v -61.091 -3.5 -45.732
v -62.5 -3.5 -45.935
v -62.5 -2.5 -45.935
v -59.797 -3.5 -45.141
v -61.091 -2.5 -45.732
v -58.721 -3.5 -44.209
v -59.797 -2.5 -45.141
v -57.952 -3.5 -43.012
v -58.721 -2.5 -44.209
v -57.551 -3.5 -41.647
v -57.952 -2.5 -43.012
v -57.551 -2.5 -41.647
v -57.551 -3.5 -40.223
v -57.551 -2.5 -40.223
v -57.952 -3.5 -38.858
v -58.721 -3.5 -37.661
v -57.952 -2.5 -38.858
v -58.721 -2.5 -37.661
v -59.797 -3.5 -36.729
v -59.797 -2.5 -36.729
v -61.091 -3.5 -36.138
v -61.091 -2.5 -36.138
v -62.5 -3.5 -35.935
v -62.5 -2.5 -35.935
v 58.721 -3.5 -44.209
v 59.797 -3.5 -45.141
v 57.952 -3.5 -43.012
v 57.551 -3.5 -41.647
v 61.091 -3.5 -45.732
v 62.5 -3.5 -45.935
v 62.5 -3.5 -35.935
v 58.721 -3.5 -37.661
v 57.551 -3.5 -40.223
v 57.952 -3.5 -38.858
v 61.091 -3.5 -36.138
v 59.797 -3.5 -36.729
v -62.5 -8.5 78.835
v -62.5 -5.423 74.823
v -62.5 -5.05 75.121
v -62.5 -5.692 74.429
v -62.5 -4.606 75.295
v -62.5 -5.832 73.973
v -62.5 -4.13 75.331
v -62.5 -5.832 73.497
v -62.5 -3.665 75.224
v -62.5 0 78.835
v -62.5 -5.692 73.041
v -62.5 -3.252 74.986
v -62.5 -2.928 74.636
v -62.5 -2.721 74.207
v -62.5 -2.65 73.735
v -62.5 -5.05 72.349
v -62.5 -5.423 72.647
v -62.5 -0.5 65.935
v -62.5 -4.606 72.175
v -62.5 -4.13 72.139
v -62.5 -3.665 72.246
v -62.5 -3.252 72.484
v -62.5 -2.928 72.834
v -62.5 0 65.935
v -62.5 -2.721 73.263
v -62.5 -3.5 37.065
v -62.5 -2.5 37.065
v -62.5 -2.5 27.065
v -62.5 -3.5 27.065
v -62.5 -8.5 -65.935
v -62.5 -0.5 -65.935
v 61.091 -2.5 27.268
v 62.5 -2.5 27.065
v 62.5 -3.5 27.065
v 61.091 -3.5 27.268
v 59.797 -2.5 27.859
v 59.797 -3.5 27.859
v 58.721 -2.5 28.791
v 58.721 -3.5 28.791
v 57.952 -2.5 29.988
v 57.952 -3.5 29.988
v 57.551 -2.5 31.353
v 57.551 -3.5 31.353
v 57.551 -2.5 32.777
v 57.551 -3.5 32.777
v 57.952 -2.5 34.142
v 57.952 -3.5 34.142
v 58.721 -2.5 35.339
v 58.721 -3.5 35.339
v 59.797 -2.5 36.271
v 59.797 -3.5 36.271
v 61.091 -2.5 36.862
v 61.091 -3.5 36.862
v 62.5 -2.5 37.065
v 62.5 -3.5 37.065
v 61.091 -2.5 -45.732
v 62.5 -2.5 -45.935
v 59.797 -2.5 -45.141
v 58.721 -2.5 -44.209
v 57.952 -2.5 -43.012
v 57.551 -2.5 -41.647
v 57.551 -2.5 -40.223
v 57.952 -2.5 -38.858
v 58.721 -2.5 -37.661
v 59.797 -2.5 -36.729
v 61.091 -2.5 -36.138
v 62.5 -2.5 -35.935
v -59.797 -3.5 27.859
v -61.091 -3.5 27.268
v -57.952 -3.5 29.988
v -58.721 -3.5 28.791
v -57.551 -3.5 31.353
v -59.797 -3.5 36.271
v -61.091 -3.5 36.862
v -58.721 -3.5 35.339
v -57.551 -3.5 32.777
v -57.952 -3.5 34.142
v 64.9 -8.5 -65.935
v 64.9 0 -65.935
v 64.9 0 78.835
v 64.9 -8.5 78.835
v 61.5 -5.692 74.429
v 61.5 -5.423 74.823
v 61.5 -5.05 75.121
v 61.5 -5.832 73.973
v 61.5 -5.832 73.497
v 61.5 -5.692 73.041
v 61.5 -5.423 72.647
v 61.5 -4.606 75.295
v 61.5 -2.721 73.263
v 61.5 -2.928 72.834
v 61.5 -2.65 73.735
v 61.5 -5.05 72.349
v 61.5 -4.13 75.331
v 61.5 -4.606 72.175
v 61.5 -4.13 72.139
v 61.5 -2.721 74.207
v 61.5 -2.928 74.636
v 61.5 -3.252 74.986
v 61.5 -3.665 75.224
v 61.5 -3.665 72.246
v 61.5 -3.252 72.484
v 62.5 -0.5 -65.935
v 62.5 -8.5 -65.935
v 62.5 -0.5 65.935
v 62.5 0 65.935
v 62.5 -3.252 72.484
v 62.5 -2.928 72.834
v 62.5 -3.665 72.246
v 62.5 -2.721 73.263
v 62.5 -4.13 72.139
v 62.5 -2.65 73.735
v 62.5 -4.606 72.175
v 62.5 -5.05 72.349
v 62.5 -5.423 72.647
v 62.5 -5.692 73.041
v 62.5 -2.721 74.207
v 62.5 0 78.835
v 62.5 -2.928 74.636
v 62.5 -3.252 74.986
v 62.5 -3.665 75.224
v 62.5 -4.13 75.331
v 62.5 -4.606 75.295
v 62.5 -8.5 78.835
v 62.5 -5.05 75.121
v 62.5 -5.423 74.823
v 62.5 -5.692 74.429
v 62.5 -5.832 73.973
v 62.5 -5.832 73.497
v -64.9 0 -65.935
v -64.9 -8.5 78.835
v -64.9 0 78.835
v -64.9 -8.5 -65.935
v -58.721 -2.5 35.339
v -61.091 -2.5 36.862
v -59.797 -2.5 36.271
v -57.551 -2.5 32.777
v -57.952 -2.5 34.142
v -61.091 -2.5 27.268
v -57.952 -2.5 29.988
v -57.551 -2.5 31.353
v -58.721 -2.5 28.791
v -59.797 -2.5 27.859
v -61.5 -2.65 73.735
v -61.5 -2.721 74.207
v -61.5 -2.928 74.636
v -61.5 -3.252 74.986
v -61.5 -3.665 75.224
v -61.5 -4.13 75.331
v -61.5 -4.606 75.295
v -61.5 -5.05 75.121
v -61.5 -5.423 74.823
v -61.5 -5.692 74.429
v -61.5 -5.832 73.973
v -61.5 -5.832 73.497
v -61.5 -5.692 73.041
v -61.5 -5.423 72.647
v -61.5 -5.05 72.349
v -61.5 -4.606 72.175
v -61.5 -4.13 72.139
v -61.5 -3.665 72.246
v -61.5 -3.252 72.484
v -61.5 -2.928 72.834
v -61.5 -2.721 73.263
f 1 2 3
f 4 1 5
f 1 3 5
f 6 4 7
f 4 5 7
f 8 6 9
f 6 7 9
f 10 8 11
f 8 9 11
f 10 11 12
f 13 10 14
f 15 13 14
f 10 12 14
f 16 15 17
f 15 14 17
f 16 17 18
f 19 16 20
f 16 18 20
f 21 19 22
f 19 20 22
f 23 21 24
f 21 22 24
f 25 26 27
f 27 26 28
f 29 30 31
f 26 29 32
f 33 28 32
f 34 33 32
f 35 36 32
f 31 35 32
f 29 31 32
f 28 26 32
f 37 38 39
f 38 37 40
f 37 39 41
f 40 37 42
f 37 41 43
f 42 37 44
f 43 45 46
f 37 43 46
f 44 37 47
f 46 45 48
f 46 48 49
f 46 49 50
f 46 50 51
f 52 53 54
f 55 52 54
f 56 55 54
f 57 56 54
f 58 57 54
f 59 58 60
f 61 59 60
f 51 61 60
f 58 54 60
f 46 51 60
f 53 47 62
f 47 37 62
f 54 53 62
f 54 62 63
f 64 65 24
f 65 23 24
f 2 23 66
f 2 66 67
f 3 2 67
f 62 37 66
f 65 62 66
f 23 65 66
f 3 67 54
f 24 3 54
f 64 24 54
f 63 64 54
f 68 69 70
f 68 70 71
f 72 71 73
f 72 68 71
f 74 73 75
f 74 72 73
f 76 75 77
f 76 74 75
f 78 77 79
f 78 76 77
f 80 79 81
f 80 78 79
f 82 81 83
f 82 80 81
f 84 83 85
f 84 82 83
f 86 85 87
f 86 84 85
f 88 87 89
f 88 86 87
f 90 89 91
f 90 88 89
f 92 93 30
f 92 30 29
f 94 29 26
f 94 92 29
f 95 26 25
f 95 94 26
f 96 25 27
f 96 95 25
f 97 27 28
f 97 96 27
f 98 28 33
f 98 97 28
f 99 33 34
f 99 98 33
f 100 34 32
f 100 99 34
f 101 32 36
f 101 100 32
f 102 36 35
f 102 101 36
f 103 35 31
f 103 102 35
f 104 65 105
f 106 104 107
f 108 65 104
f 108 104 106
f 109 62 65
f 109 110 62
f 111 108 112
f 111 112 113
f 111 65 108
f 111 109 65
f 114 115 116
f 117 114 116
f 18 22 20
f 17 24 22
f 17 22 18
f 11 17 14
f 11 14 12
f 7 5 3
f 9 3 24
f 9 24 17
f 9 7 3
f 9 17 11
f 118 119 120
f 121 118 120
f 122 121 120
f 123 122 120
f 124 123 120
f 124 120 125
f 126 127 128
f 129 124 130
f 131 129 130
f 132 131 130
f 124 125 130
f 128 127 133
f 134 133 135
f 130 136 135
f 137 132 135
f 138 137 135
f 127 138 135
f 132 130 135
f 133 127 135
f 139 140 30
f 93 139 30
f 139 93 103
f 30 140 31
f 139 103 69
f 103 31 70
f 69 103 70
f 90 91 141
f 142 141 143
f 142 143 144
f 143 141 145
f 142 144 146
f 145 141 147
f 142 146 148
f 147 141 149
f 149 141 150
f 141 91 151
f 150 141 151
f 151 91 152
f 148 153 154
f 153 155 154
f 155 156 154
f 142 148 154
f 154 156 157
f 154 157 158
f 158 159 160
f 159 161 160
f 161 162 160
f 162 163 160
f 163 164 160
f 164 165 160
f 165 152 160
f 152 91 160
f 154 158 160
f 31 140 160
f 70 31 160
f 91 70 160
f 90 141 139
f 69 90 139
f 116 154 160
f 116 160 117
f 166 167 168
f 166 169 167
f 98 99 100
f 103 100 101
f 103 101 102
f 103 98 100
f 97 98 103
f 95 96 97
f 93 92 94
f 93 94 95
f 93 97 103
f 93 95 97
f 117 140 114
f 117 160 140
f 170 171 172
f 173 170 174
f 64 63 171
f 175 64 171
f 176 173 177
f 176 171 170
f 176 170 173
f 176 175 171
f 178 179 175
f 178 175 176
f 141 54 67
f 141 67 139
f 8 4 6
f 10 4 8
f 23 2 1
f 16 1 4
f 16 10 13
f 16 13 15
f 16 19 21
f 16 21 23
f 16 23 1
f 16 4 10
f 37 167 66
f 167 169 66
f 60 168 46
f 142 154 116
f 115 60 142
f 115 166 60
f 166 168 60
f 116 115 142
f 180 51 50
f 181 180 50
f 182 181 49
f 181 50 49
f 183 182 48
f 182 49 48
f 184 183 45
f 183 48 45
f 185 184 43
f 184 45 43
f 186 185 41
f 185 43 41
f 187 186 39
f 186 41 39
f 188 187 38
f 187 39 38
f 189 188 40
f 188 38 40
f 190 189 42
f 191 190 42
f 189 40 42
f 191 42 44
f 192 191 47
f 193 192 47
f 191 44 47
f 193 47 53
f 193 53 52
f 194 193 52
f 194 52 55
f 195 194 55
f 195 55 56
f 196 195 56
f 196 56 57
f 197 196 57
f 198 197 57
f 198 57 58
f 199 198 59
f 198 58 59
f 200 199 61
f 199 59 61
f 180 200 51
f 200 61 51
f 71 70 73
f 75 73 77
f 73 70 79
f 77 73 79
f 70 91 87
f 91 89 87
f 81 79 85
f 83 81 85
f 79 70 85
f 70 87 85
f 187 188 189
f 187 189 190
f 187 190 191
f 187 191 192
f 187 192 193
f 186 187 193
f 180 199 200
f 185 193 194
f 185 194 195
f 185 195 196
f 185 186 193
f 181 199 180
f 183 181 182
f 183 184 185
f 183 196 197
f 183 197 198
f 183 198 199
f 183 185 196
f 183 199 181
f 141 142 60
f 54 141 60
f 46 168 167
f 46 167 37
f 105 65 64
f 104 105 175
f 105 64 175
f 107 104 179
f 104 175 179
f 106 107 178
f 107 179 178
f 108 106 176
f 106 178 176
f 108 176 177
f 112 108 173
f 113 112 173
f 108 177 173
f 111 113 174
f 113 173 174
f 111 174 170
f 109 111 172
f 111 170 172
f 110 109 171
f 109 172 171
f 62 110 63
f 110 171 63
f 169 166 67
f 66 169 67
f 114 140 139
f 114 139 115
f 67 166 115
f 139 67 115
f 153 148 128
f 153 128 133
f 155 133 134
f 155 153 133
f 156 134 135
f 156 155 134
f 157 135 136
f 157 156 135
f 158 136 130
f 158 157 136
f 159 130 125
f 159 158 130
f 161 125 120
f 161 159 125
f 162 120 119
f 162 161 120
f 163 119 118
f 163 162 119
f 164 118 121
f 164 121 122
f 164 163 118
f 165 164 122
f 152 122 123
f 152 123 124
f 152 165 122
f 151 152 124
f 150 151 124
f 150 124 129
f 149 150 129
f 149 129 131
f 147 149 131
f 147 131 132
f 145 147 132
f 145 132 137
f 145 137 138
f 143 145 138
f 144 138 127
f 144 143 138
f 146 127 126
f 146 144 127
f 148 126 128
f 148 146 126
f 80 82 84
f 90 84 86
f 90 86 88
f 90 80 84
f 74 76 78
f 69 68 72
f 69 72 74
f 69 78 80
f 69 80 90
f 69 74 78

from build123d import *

# Parameters (mm, degrees)
F0_W      = 1.2
F0_H      = 131.87
F0_W_2    = 127.4
F1_DEPTH  = 8.5
F2_W      = 125
F2_H      = 131.87
F3_DEPTH  = 8
F4_W      = 2.4
F4_H      = 8.5
F5_DEPTH  = 12.9
F6_R      = 1.6
F7_DEPTH  = 1
F9_DEPTH  = 3
F10_W     = 125
F10_H     = 2
F11_DEPTH = 130


# Not quite as in the source:
# - a pattern or mirror of a feature is missing from the dataset's text; its kind, count and spacing are read off the source's solid


with BuildPart() as f1:
    # F0 (on Front) → F1 (new body)
    with BuildSketch(Plane.XZ):
        with Locations((-64.3, 0)):
            Rectangle(F0_W, F0_H)
        Rectangle(F0_W_2, F0_H)
        with Locations((64.3, 0)):
            Rectangle(F0_W, F0_H)
    extrude(amount=F1_DEPTH)

    # F2 (on face) → F3 (cut)
    with BuildSketch(Plane.XZ.offset(8.5)):
        Rectangle(F2_W, F2_H)
    extrude(amount=-F3_DEPTH, mode=Mode.SUBTRACT)

    # F4 (on face) → F5 (join)
    with BuildSketch(Plane.XY.offset(65.935)):
        with Locations((-63.7, -4.25)):
            Rectangle(F4_W, F4_H)
        with Locations((63.7, -4.25)):
            Rectangle(F4_W, F4_H)
    extrude(amount=F5_DEPTH)

    # F6 (on face) → F7 (join)
    with BuildSketch(Plane.YZ.offset(-62.5)):
        with Locations((-4.25, 73.735)):
            Circle(F6_R)
    f7 = extrude(amount=F7_DEPTH)

    # F7_copies: F7 across plane
    add(f7.mirror(Plane(origin=(0, 0, 0), x_dir=(0, 0, 1), z_dir=(1, 0, 0))))

    # F8 (on face) → F9 (join)
    with BuildSketch(Plane.XZ.offset(0.5)):
        with BuildLine():
            Line((-62.5, -35.935), (-62.5, -45.935))
            ThreePointArc((-62.5, -45.935), (-57.5, -40.935), (-62.5, -35.935))
        make_face()
        with BuildLine():
            Line((-62.5, 37.065), (-62.5, 27.065))
            ThreePointArc((-62.5, 27.065), (-57.5, 32.065), (-62.5, 37.065))
        make_face()
    f9 = extrude(amount=F9_DEPTH)

    # F9_copies: F9 across plane
    add(f9.mirror(Plane(origin=(0, 0, 0), x_dir=(0, 0, 1), z_dir=(1, 0, 0))))

    # F10 (on face) → F11 (cut)
    with BuildSketch(Plane(origin=(0, 0, -65.935), x_dir=(1, 0, 0), z_dir=(0, 0, -1))):
        with Locations((0, 1.5)):
            Rectangle(F10_W, F10_H)
    extrude(amount=-F11_DEPTH, mode=Mode.SUBTRACT)


solid = f1.part
